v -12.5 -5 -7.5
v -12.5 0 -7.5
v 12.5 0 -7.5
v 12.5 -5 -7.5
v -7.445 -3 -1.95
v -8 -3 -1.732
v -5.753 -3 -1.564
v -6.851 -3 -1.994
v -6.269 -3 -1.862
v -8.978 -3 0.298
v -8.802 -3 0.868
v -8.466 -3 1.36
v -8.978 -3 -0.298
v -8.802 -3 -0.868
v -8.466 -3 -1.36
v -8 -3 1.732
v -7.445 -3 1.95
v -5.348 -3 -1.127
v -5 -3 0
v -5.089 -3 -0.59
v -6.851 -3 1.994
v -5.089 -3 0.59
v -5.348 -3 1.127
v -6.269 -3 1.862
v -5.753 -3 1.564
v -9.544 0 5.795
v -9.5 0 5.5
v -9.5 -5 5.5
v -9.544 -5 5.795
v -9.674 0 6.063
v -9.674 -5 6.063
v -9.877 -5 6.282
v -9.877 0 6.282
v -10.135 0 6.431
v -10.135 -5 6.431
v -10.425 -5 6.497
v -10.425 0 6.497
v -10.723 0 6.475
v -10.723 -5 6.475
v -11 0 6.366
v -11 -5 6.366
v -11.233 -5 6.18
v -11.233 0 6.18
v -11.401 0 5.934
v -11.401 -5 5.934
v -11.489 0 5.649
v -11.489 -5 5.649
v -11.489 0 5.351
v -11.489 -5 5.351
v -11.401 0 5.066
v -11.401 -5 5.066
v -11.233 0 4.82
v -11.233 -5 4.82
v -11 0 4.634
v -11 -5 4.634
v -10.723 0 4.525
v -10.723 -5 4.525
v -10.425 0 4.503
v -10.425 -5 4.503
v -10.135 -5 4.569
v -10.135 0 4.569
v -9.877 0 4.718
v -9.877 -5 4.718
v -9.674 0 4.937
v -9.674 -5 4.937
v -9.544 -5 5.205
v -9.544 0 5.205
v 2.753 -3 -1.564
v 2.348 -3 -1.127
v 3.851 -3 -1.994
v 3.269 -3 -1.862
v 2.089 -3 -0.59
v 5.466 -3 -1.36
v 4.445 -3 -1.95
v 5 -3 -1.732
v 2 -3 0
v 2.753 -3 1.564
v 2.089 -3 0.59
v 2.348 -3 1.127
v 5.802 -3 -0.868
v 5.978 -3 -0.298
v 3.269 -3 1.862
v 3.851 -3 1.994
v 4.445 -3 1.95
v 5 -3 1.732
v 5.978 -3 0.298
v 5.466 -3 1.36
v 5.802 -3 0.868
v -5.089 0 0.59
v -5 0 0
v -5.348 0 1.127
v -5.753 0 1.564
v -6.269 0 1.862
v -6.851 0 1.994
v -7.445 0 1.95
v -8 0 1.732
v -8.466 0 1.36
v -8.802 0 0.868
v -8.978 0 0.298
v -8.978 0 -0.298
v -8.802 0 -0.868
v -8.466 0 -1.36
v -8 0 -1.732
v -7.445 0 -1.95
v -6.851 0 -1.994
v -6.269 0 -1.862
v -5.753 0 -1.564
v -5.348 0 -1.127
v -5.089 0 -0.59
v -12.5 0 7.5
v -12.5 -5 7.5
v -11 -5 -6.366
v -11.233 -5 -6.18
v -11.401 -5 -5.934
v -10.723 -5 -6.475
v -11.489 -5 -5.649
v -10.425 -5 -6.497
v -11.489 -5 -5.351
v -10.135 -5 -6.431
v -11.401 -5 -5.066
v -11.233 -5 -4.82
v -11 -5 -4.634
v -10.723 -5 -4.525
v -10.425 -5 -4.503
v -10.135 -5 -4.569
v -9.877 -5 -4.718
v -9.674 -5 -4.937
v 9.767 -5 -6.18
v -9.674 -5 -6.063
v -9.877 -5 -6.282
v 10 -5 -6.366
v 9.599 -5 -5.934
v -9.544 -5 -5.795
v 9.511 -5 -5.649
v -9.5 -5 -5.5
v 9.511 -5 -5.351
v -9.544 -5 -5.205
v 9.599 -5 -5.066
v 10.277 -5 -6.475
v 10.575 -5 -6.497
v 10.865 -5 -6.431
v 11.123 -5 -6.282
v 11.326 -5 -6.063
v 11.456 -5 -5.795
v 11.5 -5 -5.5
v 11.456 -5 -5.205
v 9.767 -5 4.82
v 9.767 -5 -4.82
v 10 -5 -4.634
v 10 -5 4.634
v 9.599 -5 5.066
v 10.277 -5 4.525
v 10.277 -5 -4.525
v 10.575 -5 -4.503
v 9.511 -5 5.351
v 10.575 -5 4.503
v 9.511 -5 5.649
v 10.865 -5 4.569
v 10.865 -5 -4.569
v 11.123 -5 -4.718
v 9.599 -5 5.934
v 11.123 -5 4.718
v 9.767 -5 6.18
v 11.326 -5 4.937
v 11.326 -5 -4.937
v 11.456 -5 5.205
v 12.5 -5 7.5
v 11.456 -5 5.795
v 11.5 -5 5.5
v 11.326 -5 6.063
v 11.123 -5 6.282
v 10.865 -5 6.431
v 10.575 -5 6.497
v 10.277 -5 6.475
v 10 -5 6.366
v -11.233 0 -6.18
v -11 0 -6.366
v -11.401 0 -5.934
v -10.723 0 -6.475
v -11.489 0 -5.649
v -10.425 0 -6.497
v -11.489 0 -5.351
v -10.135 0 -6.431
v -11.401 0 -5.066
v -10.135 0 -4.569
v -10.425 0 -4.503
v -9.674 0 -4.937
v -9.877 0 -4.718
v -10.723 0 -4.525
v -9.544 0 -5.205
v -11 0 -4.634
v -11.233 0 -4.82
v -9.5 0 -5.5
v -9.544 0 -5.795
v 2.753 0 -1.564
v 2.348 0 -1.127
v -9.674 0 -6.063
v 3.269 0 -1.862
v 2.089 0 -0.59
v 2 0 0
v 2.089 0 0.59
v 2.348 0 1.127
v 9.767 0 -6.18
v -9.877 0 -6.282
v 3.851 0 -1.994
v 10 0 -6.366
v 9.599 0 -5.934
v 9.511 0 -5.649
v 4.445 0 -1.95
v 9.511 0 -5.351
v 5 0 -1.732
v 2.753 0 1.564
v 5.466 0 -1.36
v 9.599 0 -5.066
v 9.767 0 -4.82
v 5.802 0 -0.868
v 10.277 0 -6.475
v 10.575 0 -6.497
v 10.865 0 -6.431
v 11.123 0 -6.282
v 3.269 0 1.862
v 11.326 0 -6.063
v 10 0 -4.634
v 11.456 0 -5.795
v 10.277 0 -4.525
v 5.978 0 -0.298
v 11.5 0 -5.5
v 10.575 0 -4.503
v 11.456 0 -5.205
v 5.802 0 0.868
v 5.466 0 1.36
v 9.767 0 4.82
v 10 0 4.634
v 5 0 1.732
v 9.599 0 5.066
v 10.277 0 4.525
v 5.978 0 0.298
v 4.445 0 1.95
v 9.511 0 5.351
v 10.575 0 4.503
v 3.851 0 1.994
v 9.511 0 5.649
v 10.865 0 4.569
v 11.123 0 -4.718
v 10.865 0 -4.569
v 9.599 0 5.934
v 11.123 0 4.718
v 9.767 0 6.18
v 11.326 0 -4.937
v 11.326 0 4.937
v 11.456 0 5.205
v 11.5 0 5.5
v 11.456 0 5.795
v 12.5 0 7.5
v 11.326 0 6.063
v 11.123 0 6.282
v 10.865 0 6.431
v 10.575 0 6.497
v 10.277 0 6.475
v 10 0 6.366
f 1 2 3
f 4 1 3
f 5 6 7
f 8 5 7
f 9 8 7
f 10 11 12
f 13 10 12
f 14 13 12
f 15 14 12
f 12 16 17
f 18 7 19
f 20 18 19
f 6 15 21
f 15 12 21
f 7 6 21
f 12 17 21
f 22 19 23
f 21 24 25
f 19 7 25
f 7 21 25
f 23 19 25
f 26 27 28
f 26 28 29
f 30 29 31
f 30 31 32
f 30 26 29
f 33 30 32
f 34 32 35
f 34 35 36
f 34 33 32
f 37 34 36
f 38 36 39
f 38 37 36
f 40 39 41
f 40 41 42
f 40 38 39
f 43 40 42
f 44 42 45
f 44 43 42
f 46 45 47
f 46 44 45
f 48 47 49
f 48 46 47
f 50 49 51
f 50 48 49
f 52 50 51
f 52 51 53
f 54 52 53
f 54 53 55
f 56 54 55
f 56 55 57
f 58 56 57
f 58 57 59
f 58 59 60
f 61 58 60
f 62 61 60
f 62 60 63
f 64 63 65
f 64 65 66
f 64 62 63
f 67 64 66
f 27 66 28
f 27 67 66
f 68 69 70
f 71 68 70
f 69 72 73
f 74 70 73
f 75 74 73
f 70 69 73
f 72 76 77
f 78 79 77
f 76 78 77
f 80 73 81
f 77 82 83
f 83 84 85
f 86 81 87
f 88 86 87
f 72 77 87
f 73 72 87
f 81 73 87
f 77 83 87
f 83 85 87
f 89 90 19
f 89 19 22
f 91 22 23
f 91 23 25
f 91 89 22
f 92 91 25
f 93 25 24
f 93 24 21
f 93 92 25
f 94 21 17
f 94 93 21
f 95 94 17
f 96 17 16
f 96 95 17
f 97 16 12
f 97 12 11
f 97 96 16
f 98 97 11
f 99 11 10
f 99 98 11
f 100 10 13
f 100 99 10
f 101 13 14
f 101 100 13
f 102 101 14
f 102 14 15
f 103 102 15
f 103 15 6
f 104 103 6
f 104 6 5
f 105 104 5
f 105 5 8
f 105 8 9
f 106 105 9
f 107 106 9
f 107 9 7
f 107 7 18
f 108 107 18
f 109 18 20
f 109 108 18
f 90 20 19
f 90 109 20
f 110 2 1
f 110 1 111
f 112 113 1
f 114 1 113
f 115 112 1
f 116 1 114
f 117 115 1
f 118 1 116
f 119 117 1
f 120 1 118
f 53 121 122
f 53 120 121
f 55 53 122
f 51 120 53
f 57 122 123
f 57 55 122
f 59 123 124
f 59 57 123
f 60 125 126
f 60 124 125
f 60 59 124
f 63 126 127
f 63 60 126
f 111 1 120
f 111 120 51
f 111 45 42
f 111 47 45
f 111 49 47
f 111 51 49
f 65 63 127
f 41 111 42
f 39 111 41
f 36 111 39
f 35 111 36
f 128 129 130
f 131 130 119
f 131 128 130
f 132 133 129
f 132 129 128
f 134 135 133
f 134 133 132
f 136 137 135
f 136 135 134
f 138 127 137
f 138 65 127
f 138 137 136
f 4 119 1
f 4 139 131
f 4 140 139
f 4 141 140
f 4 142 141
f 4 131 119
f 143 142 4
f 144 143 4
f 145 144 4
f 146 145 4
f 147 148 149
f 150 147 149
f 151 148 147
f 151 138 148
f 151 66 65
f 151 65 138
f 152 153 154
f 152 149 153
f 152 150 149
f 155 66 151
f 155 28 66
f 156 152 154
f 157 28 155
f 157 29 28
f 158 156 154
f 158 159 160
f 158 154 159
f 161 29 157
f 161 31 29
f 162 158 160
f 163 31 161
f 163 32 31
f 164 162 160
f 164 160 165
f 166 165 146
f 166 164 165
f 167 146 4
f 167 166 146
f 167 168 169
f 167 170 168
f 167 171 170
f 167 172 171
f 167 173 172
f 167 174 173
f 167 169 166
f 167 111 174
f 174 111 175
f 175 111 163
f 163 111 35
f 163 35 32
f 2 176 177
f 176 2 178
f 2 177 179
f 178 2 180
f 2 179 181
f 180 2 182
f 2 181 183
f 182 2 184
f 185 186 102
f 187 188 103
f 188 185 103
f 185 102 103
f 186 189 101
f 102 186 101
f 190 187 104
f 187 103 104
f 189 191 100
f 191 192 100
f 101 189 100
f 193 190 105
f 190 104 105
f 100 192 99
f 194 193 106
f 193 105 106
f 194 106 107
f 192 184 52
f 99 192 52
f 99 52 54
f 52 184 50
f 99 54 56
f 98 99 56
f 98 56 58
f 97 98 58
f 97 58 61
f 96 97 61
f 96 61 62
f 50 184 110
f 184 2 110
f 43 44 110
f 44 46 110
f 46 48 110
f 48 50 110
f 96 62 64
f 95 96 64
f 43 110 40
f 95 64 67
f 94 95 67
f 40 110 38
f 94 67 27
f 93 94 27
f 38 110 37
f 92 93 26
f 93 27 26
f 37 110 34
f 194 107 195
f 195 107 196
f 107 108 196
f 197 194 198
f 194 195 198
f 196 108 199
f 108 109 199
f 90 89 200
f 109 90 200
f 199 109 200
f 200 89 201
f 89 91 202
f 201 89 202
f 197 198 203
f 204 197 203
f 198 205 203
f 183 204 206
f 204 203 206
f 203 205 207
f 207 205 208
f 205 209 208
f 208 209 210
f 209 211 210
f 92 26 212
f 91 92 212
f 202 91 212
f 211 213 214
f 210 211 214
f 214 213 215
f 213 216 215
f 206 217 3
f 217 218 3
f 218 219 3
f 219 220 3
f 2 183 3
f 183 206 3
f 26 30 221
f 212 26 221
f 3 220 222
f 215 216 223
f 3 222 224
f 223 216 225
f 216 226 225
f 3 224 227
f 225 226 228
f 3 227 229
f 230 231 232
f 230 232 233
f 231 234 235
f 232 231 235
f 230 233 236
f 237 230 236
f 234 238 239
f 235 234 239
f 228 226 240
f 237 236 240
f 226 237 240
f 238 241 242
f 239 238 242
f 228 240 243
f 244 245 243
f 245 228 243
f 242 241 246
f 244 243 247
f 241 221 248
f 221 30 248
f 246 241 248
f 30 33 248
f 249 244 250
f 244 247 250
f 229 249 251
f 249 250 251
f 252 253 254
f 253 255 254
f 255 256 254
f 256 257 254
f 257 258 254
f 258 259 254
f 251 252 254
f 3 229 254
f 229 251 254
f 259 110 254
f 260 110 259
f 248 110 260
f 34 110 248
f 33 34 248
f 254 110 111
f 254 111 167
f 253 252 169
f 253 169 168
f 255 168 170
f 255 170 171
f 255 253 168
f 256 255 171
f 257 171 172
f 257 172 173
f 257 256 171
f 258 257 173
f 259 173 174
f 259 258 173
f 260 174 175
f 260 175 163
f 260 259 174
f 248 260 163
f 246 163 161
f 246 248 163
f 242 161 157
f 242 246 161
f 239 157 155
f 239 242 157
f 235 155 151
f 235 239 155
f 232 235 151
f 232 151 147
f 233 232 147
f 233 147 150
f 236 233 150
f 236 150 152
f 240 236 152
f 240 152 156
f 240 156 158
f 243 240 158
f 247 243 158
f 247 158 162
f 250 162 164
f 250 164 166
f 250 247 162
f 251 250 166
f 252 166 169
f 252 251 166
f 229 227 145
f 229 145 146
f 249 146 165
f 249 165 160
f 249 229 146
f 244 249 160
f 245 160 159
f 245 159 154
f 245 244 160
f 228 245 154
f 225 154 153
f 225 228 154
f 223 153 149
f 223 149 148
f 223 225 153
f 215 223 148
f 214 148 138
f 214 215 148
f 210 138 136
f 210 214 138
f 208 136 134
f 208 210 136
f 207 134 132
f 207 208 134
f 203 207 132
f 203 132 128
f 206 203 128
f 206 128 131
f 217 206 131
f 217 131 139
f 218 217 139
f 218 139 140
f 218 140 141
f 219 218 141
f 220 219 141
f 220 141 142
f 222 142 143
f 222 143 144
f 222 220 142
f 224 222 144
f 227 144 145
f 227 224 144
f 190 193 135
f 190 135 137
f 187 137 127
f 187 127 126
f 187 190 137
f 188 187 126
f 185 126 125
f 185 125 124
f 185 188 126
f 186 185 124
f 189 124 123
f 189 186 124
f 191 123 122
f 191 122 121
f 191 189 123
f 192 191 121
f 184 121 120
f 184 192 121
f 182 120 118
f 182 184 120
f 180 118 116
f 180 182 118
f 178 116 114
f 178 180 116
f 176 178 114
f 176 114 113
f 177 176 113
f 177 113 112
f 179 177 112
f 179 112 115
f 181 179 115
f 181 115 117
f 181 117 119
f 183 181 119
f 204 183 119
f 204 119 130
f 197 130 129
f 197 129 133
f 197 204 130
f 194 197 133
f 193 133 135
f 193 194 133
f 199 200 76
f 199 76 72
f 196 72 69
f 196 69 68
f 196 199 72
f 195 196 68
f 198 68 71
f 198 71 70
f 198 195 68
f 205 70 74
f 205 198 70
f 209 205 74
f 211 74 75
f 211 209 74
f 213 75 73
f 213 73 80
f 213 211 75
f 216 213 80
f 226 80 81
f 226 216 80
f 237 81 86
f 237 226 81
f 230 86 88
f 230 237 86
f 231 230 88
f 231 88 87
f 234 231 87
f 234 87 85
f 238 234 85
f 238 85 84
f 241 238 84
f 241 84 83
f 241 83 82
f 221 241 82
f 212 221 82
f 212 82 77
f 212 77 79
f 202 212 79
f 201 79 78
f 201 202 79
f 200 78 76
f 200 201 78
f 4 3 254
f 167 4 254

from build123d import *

# Parameters (mm, degrees)
F0_W     = 25
F0_H     = 15
F0_R     = 1
F0_R_2   = 2
F0_R_3   = 0.5
F1_DEPTH = 5
F2_DEPTH = 3


with BuildPart() as f1:
    # F0 (on Front) → F1 (new body)
    with BuildSketch(Plane.XZ):
        Rectangle(F0_W, F0_H)
        with Locations((-10.5, -5.5)):
            Circle(F0_R, mode=Mode.SUBTRACT)
        with Locations((10.5, -5.5)):
            Circle(F0_R, mode=Mode.SUBTRACT)
        with Locations((-7, 0)):
            Circle(F0_R_2, mode=Mode.SUBTRACT)
        with Locations((-10.5, 5.5)):
            Circle(F0_R, mode=Mode.SUBTRACT)
        with BuildLine():
            ThreePointArc((6, 0), (4, -2), (2, 0))
            ThreePointArc((2, 0), (4, 2), (6, 0))
        make_face(mode=Mode.SUBTRACT)
        with Locations((10.5, 5.5)):
            Circle(F0_R, mode=Mode.SUBTRACT)
        with Locations((-7, 0)):
            Circle(F0_R_2)
        with Locations((-7, 0)):
            Circle(F0_R_3, mode=Mode.SUBTRACT)
        with BuildLine():
            ThreePointArc((6, 0), (4, 2), (2, 0))
            ThreePointArc((2, 0), (4, -2), (6, 0))
        make_face()
        with BuildLine():
            ThreePointArc((4.5, 0), (4, -0.5), (3.5, 0))
            ThreePointArc((3.5, 0), (4, 0.5), (4.5, 0))
        make_face(mode=Mode.SUBTRACT)
        with Locations((-7, 0)):
            Circle(F0_R_3)
        with BuildLine():
            ThreePointArc((4.5, 0), (4, 0.5), (3.5, 0))
            ThreePointArc((3.5, 0), (4, -0.5), (4.5, 0))
        make_face()
    extrude(amount=F1_DEPTH)

    # F0 (on Front) → F2 (cut)
    with BuildSketch(Plane.XZ):
        with Locations((-7, 0)):
            Circle(F0_R_2)
        with Locations((-7, 0)):
            Circle(F0_R_3, mode=Mode.SUBTRACT)
        with BuildLine():
            ThreePointArc((6, 0), (4, 2), (2, 0))
            ThreePointArc((2, 0), (4, -2), (6, 0))
        make_face()
        with BuildLine():
            ThreePointArc((4.5, 0), (4, -0.5), (3.5, 0))
            ThreePointArc((3.5, 0), (4, 0.5), (4.5, 0))
        make_face(mode=Mode.SUBTRACT)
        with BuildLine():
            ThreePointArc((4.5, 0), (4, 0.5), (3.5, 0))
            ThreePointArc((3.5, 0), (4, -0.5), (4.5, 0))
        make_face()
        with Locations((-7, 0)):
            Circle(F0_R_3)
    extrude(amount=F2_DEPTH, mode=Mode.SUBTRACT)


solid = f1.part
